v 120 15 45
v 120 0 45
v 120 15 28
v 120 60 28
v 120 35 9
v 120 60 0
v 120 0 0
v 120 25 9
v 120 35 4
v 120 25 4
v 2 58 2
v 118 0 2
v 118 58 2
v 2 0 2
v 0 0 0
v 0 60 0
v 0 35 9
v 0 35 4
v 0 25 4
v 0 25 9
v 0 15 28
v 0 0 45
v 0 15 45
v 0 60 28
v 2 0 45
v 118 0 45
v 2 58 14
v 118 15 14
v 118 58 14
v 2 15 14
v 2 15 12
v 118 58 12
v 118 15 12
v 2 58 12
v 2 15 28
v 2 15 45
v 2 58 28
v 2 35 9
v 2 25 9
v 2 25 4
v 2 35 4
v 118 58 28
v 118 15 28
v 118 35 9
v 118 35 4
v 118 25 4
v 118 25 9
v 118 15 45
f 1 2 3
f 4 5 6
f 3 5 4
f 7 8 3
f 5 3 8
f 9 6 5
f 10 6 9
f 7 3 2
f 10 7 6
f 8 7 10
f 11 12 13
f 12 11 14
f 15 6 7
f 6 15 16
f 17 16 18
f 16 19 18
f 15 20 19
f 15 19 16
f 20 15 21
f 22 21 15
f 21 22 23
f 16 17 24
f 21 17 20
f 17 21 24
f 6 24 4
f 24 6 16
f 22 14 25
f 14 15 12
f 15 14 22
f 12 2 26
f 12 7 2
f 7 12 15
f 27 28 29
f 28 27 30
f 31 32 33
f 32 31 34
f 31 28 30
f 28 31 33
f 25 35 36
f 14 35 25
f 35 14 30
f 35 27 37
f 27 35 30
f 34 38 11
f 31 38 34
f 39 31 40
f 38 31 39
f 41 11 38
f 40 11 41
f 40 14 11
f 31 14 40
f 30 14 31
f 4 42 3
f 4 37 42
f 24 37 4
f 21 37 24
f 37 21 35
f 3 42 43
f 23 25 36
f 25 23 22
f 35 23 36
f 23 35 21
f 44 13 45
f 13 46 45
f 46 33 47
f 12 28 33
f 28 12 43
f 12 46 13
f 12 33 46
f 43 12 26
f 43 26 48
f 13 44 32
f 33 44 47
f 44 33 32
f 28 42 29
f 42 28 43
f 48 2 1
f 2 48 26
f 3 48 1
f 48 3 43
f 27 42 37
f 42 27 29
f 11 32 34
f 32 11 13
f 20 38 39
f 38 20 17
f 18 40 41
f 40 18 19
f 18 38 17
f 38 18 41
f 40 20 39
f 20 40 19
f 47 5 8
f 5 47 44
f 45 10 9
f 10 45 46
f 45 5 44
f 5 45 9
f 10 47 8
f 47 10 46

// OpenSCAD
// Simple pill box parts viewer
// Change `part` to one of:
// "frame"     -> frame only
// "pill_tray" -> pill tray only
// "lid_set"   -> four separate hinged lids
// "assembly"  -> combined view
// OpenSCAD units: mm

part = "frame";

$fn = 48;

// ------------------------------------------------------------
// Main dimensions
// ------------------------------------------------------------
case_w = 120;
case_d = 60;

wall = 2;
plate_th = 2;
gap_12 = 10;
channel_roof_th = 2;
tray_clearance = 12;

outer_r = 0;
tray_r = 0;
lid_r = 2;
tab_r = 1.2;

usb_cutout_w = 10;
usb_cutout_h = 5;
usb_cutout_bottom_z = 4;

upper_inset = 15;
upper_len = 45;

ui_square = 20;
ui_button_d = 10;
ui_gap = 10;

top_hole = 15;
top_hole_y = upper_inset + (upper_len - top_hole) / 2;
tray_h = 17;

pill_open = 26;
pill_bottom_open = 10;
pill_center_y = top_hole_y + top_hole / 2;
pill_gap = 2;
pill_group_w = pill_open * 4 + pill_gap * 3;
pill_start_x = (case_w - pill_group_w) / 2;
pill_centers_x = [
    for (i = [0:3])
        pill_start_x + pill_open / 2 + i * (pill_open + pill_gap)
];

// Hinges use a 1.75 mm filament offcut as the pin.
hinge_pin_hole_d = 2.15;
hinge_outer_d = 5.2;
hinge_base_clearance = 0.6;
hinge_support_len = 4.2;
hinge_end_margin = 0.4;
hinge_y = case_d - hinge_outer_d / 2 - 0.8;
hinge_lid_barrel_len = 20;
lid_w = pill_open + 0.2;
lid_d = pill_open + 3;
lid_th = 2;
lid_z_gap = 0.35;
lid_pull_tab_w = 9;
lid_pull_tab_d = 4;

// ------------------------------------------------------------
// Helpers
// ------------------------------------------------------------
module rounded_rect_2d(w, d, r) {
    rr = min(r, min(w, d) / 2 - 0.01);

    if (rr <= 0) {
        square([w, d], center = true);
    } else {
        hull() {
            for (x = [-w / 2 + rr, w / 2 - rr])
                for (y = [-d / 2 + rr, d / 2 - rr])
                    translate([x, y])
                        circle(r = rr);
        }
    }
}

module rounded_box(size, r = 0) {
    if (r <= 0) {
        cube(size);
    } else {
        linear_extrude(height = size[2])
            translate([size[0] / 2, size[1] / 2])
                rounded_rect_2d(size[0], size[1], r);
    }
}

module rounded_y_box(size, r = 0) {
    if (r <= 0) {
        cube(size);
    } else {
        // Extrude along Y so the visible X-Z face gets rounded corners.
        multmatrix([
            [1, 0, 0, 0],
            [0, 0, 1, 0],
            [0, 1, 0, 0],
            [0, 0, 0, 1]
        ])
            linear_extrude(height = size[1])
                translate([size[0] / 2, size[2] / 2])
                    rounded_rect_2d(size[0], size[2], r);
    }
}

module rounded_square_2d(size, r) {
    rounded_rect_2d(size, size, r);
}

module tray_body_box(size, r = 0) {
    w = size[0];
    d = size[1];
    h = size[2];
    rr = min(r, min(w, d) / 2 - 0.01);

    if (rr <= 0) {
        cube(size);
    } else {
        // Keep the front edge flat so it mates cleanly with the front face.
        linear_extrude(height = h)
            polygon(points = [
                [0, 0],
                [w, 0],
                [w, d - rr],
                for (a = [0:8]) [
                    w - rr + rr * cos(a * 90 / 8),
                    d - rr + rr * sin(a * 90 / 8)
                ],
                [rr, d],
                for (a = [0:8]) [
                    rr + rr * cos(90 + a * 90 / 8),
                    d - rr + rr * sin(90 + a * 90 / 8)
                ],
                [0, 0]
            ]);
    }
}

module funnel_hole(cx, cy, top_size, bottom_size) {
    translate([cx, cy, 0])
        hull() {
            translate([0, 0, tray_h - 0.1])
                linear_extrude(height = 0.2)
                    rounded_square_2d(top_size, 3);

            translate([0, 0, -0.1])
                linear_extrude(height = 0.2)
                    rounded_square_2d(bottom_size, 1.5);
        }
}

function shelf2_z() = plate_th + gap_12;
function tray_mount_z() = shelf2_z() + plate_th + tray_clearance;
function tray_full_h() = tray_mount_z() + tray_h;
function ui_group_w() = ui_square + ui_gap + ui_button_d;
function ui_square_x() = (case_w - ui_group_w()) / 2;
function ui_square_z() = (tray_full_h() - ui_square) / 2;
function ui_button_x() = ui_square_x() + ui_square + ui_gap + ui_button_d / 2;
function ui_button_z() = tray_full_h() / 2;

module usb_c_side_cutouts() {
    cutout_y = case_d / 2 - usb_cutout_w / 2;

    // Left side USB-C cable clearance.
    translate([-0.1, cutout_y, usb_cutout_bottom_z])
        cube([wall + 0.2, usb_cutout_w, usb_cutout_h]);

    // Right side USB-C cable clearance.
    translate([case_w - wall - 0.1, cutout_y, usb_cutout_bottom_z])
        cube([wall + 0.2, usb_cutout_w, usb_cutout_h]);
}

module hinge_barrel_x(x, y, z, len) {
    translate([x, y, z])
        rotate([0, 90, 0])
            difference() {
                cylinder(h = len, d = hinge_outer_d);

                translate([0, 0, -0.1])
                    cylinder(h = len + 0.2, d = hinge_pin_hole_d);
            }
}

module tray_hinge_end_supports() {
    axis_z = tray_h + hinge_base_clearance + hinge_outer_d / 2;
    base_h = 1.4;
    base_y = hinge_y - hinge_outer_d / 2;

    union() {
        // End barrels hold one long filament pin for all four lids.
        hinge_barrel_x(hinge_end_margin, hinge_y, axis_z, hinge_support_len);

        translate([case_w - hinge_end_margin - hinge_support_len, 0, 0])
            hinge_barrel_x(0, hinge_y, axis_z, hinge_support_len);

        // Small feet give the printed hinge barrels real contact area.
        translate([hinge_end_margin, base_y, tray_h - 0.1])
            cube([hinge_support_len, hinge_outer_d, base_h]);

        translate([case_w - hinge_end_margin - hinge_support_len, base_y, tray_h - 0.1])
            cube([hinge_support_len, hinge_outer_d, base_h]);
    }
}

module lid_piece(cx) {
    axis_z = tray_h + hinge_base_clearance + hinge_outer_d / 2;
    lid_x = cx - lid_w / 2;
    lid_y = pill_center_y - lid_d / 2;
    lid_z = tray_h + lid_z_gap;
    barrel_x = cx - hinge_lid_barrel_len / 2;
    tab_x = cx - lid_pull_tab_w / 2;
    leaf_y = lid_y + lid_d - 0.8;
    leaf_len = hinge_y - hinge_outer_d / 2 - leaf_y + 1.2;

    union() {
        // Main lid plate. It sits slightly above the tray top to avoid scraping.
        translate([lid_x, lid_y, lid_z])
            rounded_box([lid_w, lid_d, lid_th], lid_r);

        // Finger pull on the side opposite the hinge.
        translate([tab_x, lid_y - lid_pull_tab_d + 0.2, lid_z])
            rounded_box([lid_pull_tab_w, lid_pull_tab_d, lid_th], tab_r);

        // Lid barrel rotates around the filament pin.
        hinge_barrel_x(barrel_x, hinge_y, axis_z, hinge_lid_barrel_len);

        // Leaf ties into the back of the barrel without blocking the pin hole.
        translate([lid_x, leaf_y, lid_z])
            cube([lid_w, leaf_len, lid_th]);
    }
}

module lid_set_local() {
    for (cx = pill_centers_x)
        lid_piece(cx);
}

module lid_set() {
    color("#eeeeee")
        translate([0, 0, -tray_h])
            lid_set_local();
}

// ------------------------------------------------------------
// Parts
// ------------------------------------------------------------
module frame() {
    // The tray sits on top of the 2 mm frame floor, so the frame needs
    // 43 mm of internal height plus the floor thickness.
    frame_wall_h = tray_mount_z() + plate_th;
    full_h = tray_full_h() + plate_th;

    difference() {
        union() {
            // 1st floor plate
            rounded_box([case_w, case_d, plate_th], outer_r);

            // 2nd floor plate
            translate([0, upper_inset, shelf2_z()])
                rounded_box([case_w, upper_len, plate_th], outer_r);

            // Left outer wall
            tray_body_box([wall, case_d, frame_wall_h], outer_r);

            // Close the side of the front service channel without rounding the mating edge.
            translate([0, 0, frame_wall_h])
                cube([wall, upper_inset, full_h - frame_wall_h]);

            // Right outer wall
            translate([case_w - wall, 0, 0])
                tray_body_box([wall, case_d, frame_wall_h], outer_r);

            // Close the side of the front service channel without rounding the mating edge.
            translate([case_w - wall, 0, frame_wall_h])
                cube([wall, upper_inset, full_h - frame_wall_h]);

            // Rear outer wall
            translate([0, case_d - wall, 0])
                rounded_box([case_w, wall, frame_wall_h], outer_r);
        }

        usb_c_side_cutouts();
    }
}

module pill_tray_core() {
    union() {
        difference() {
            translate([0, upper_inset, 0])
                tray_body_box([case_w, upper_len, tray_h], tray_r);

            for (cx = pill_centers_x)
                funnel_hole(cx, pill_center_y, pill_open, pill_bottom_open);

        }

        tray_hinge_end_supports();
    }
}

module pill_tray_cap() {
    full_h = tray_full_h();

    union() {
        difference() {
            // Front vertical face
            translate([wall, 0, 0])
                cube([case_w - 2 * wall, wall, full_h]);

            // Centered square opening
            translate([ui_square_x(), -0.1, ui_square_z()])
                cube([ui_square, wall + 0.2, ui_square]);

            // Centered round opening
            translate([ui_button_x(), wall / 2, ui_button_z()])
                rotate([90, 0, 0])
                    cylinder(h = wall + 0.2, d = ui_button_d, center = true);
        }

        // Thin roof over the front service channel
        translate([wall, 0, full_h - channel_roof_th])
            cube([case_w - 2 * wall, upper_inset, channel_roof_th]);
    }
}

module pill_tray() {
    union() {
        color("#cfcfcf")
            pill_tray_cap();

        color("#cfcfcf")
            translate([0, 0, tray_mount_z()])
                pill_tray_core();
    }
}

module assembly() {
    color("#d9d9d9")
        frame();

    translate([0, 0, plate_th])
        pill_tray();

    color("#eeeeee")
        translate([0, 0, plate_th + tray_mount_z()])
            lid_set_local();
}

// ------------------------------------------------------------
// Output
// ------------------------------------------------------------
if (part == "frame") {
    color("#d9d9d9") frame();
} else if (part == "pill_tray") {
    pill_tray();
} else if (part == "lid_set") {
    lid_set();
} else if (part == "assembly") {
    assembly();
} else {
    assembly();
}
